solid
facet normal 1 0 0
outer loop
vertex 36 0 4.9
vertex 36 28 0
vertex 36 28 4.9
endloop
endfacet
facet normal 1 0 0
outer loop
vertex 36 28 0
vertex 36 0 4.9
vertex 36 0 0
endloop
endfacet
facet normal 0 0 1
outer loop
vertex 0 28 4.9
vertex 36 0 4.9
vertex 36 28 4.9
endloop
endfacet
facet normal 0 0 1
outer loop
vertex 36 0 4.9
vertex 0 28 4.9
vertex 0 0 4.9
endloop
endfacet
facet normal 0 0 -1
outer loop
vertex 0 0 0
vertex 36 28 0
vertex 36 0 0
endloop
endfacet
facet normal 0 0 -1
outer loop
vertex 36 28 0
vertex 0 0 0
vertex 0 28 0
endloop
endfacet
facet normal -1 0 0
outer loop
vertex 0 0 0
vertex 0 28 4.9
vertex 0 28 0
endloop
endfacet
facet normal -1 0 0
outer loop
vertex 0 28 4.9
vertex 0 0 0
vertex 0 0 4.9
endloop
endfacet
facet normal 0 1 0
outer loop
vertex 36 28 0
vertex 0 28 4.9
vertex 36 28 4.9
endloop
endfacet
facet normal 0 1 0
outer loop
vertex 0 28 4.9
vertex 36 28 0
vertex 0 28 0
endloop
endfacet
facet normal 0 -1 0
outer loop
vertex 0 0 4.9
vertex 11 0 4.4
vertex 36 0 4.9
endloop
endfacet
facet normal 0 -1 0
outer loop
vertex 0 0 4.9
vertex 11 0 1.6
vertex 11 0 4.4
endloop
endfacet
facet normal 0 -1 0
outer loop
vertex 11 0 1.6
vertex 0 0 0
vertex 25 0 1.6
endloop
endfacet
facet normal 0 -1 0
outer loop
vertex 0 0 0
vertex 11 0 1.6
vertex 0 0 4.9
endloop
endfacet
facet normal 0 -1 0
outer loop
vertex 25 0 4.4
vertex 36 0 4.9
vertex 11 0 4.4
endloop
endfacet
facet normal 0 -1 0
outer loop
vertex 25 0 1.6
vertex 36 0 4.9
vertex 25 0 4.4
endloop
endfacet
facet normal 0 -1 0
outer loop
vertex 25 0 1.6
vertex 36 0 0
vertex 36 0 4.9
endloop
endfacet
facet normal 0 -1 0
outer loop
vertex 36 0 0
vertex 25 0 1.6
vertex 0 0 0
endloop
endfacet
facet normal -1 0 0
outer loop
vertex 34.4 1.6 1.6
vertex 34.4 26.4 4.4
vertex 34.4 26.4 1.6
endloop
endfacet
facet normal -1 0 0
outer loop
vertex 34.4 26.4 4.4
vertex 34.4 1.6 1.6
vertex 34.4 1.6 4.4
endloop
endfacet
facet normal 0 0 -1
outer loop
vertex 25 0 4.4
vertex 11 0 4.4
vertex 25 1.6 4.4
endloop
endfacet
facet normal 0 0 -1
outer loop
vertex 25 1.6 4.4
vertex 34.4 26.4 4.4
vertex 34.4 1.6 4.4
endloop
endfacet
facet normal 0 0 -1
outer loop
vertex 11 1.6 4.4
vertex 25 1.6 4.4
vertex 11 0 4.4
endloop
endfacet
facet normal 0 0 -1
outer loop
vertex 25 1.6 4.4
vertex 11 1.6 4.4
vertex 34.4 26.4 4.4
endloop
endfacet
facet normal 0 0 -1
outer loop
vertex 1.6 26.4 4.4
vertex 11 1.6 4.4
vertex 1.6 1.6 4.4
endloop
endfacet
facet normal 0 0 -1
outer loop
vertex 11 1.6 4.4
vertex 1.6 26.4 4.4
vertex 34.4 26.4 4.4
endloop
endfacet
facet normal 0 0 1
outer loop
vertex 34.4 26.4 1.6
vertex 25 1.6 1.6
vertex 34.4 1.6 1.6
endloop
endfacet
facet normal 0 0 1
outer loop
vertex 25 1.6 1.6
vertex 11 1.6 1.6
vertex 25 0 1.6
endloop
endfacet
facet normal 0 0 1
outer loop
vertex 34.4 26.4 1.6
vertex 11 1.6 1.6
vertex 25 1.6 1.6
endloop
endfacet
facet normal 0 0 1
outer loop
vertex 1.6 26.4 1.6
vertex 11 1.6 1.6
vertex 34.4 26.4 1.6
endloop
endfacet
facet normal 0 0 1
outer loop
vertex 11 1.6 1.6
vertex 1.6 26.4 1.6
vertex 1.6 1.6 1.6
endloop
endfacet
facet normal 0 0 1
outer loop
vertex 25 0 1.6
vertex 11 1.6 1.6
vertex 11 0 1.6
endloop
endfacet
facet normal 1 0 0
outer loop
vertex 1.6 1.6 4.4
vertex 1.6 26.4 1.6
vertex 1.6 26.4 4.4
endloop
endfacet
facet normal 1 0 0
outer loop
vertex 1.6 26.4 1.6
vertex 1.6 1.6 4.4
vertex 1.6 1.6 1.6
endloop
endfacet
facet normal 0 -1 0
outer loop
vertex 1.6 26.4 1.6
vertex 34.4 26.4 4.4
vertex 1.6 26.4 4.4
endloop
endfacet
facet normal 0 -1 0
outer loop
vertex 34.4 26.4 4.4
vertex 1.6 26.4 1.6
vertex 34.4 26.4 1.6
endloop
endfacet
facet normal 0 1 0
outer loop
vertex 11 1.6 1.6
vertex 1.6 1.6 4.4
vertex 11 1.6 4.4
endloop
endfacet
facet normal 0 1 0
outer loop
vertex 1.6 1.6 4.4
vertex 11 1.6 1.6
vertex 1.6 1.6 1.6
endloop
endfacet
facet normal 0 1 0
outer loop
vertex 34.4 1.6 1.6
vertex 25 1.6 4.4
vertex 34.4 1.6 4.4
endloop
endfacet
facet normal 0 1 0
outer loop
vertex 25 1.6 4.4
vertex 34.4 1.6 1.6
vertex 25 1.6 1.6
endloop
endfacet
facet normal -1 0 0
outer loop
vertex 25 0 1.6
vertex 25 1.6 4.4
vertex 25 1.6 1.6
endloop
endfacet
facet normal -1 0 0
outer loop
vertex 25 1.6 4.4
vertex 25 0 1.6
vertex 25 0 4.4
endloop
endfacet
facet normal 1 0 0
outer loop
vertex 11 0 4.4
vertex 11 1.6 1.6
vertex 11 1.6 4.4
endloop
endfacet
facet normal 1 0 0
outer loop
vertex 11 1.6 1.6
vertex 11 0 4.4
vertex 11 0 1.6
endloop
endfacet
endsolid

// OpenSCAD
// SD card tray — shallow pocket + front finger notch
card_w = 32.4;
card_l = 24.4;
card_t = 2.3;
wall = 1.6;
clearance_top = 1;
finger_w = 14;
finger_depth = 8;
$fn = 32;

inner_w = card_w + 0.4;
inner_l = card_l + 0.4;
outer_w = inner_w + 2 * wall;
outer_l = inner_l + 2 * wall;
outer_h = card_t + wall + clearance_top;

difference() {
  cube([outer_w, outer_l, outer_h]);
  translate([wall, wall, wall])
    cube([inner_w, inner_l, card_t + 0.5]);
  translate([(outer_w - finger_w) / 2, -0.1, wall])
    cube([finger_w, finger_depth + wall, card_t + 0.5]);
}
